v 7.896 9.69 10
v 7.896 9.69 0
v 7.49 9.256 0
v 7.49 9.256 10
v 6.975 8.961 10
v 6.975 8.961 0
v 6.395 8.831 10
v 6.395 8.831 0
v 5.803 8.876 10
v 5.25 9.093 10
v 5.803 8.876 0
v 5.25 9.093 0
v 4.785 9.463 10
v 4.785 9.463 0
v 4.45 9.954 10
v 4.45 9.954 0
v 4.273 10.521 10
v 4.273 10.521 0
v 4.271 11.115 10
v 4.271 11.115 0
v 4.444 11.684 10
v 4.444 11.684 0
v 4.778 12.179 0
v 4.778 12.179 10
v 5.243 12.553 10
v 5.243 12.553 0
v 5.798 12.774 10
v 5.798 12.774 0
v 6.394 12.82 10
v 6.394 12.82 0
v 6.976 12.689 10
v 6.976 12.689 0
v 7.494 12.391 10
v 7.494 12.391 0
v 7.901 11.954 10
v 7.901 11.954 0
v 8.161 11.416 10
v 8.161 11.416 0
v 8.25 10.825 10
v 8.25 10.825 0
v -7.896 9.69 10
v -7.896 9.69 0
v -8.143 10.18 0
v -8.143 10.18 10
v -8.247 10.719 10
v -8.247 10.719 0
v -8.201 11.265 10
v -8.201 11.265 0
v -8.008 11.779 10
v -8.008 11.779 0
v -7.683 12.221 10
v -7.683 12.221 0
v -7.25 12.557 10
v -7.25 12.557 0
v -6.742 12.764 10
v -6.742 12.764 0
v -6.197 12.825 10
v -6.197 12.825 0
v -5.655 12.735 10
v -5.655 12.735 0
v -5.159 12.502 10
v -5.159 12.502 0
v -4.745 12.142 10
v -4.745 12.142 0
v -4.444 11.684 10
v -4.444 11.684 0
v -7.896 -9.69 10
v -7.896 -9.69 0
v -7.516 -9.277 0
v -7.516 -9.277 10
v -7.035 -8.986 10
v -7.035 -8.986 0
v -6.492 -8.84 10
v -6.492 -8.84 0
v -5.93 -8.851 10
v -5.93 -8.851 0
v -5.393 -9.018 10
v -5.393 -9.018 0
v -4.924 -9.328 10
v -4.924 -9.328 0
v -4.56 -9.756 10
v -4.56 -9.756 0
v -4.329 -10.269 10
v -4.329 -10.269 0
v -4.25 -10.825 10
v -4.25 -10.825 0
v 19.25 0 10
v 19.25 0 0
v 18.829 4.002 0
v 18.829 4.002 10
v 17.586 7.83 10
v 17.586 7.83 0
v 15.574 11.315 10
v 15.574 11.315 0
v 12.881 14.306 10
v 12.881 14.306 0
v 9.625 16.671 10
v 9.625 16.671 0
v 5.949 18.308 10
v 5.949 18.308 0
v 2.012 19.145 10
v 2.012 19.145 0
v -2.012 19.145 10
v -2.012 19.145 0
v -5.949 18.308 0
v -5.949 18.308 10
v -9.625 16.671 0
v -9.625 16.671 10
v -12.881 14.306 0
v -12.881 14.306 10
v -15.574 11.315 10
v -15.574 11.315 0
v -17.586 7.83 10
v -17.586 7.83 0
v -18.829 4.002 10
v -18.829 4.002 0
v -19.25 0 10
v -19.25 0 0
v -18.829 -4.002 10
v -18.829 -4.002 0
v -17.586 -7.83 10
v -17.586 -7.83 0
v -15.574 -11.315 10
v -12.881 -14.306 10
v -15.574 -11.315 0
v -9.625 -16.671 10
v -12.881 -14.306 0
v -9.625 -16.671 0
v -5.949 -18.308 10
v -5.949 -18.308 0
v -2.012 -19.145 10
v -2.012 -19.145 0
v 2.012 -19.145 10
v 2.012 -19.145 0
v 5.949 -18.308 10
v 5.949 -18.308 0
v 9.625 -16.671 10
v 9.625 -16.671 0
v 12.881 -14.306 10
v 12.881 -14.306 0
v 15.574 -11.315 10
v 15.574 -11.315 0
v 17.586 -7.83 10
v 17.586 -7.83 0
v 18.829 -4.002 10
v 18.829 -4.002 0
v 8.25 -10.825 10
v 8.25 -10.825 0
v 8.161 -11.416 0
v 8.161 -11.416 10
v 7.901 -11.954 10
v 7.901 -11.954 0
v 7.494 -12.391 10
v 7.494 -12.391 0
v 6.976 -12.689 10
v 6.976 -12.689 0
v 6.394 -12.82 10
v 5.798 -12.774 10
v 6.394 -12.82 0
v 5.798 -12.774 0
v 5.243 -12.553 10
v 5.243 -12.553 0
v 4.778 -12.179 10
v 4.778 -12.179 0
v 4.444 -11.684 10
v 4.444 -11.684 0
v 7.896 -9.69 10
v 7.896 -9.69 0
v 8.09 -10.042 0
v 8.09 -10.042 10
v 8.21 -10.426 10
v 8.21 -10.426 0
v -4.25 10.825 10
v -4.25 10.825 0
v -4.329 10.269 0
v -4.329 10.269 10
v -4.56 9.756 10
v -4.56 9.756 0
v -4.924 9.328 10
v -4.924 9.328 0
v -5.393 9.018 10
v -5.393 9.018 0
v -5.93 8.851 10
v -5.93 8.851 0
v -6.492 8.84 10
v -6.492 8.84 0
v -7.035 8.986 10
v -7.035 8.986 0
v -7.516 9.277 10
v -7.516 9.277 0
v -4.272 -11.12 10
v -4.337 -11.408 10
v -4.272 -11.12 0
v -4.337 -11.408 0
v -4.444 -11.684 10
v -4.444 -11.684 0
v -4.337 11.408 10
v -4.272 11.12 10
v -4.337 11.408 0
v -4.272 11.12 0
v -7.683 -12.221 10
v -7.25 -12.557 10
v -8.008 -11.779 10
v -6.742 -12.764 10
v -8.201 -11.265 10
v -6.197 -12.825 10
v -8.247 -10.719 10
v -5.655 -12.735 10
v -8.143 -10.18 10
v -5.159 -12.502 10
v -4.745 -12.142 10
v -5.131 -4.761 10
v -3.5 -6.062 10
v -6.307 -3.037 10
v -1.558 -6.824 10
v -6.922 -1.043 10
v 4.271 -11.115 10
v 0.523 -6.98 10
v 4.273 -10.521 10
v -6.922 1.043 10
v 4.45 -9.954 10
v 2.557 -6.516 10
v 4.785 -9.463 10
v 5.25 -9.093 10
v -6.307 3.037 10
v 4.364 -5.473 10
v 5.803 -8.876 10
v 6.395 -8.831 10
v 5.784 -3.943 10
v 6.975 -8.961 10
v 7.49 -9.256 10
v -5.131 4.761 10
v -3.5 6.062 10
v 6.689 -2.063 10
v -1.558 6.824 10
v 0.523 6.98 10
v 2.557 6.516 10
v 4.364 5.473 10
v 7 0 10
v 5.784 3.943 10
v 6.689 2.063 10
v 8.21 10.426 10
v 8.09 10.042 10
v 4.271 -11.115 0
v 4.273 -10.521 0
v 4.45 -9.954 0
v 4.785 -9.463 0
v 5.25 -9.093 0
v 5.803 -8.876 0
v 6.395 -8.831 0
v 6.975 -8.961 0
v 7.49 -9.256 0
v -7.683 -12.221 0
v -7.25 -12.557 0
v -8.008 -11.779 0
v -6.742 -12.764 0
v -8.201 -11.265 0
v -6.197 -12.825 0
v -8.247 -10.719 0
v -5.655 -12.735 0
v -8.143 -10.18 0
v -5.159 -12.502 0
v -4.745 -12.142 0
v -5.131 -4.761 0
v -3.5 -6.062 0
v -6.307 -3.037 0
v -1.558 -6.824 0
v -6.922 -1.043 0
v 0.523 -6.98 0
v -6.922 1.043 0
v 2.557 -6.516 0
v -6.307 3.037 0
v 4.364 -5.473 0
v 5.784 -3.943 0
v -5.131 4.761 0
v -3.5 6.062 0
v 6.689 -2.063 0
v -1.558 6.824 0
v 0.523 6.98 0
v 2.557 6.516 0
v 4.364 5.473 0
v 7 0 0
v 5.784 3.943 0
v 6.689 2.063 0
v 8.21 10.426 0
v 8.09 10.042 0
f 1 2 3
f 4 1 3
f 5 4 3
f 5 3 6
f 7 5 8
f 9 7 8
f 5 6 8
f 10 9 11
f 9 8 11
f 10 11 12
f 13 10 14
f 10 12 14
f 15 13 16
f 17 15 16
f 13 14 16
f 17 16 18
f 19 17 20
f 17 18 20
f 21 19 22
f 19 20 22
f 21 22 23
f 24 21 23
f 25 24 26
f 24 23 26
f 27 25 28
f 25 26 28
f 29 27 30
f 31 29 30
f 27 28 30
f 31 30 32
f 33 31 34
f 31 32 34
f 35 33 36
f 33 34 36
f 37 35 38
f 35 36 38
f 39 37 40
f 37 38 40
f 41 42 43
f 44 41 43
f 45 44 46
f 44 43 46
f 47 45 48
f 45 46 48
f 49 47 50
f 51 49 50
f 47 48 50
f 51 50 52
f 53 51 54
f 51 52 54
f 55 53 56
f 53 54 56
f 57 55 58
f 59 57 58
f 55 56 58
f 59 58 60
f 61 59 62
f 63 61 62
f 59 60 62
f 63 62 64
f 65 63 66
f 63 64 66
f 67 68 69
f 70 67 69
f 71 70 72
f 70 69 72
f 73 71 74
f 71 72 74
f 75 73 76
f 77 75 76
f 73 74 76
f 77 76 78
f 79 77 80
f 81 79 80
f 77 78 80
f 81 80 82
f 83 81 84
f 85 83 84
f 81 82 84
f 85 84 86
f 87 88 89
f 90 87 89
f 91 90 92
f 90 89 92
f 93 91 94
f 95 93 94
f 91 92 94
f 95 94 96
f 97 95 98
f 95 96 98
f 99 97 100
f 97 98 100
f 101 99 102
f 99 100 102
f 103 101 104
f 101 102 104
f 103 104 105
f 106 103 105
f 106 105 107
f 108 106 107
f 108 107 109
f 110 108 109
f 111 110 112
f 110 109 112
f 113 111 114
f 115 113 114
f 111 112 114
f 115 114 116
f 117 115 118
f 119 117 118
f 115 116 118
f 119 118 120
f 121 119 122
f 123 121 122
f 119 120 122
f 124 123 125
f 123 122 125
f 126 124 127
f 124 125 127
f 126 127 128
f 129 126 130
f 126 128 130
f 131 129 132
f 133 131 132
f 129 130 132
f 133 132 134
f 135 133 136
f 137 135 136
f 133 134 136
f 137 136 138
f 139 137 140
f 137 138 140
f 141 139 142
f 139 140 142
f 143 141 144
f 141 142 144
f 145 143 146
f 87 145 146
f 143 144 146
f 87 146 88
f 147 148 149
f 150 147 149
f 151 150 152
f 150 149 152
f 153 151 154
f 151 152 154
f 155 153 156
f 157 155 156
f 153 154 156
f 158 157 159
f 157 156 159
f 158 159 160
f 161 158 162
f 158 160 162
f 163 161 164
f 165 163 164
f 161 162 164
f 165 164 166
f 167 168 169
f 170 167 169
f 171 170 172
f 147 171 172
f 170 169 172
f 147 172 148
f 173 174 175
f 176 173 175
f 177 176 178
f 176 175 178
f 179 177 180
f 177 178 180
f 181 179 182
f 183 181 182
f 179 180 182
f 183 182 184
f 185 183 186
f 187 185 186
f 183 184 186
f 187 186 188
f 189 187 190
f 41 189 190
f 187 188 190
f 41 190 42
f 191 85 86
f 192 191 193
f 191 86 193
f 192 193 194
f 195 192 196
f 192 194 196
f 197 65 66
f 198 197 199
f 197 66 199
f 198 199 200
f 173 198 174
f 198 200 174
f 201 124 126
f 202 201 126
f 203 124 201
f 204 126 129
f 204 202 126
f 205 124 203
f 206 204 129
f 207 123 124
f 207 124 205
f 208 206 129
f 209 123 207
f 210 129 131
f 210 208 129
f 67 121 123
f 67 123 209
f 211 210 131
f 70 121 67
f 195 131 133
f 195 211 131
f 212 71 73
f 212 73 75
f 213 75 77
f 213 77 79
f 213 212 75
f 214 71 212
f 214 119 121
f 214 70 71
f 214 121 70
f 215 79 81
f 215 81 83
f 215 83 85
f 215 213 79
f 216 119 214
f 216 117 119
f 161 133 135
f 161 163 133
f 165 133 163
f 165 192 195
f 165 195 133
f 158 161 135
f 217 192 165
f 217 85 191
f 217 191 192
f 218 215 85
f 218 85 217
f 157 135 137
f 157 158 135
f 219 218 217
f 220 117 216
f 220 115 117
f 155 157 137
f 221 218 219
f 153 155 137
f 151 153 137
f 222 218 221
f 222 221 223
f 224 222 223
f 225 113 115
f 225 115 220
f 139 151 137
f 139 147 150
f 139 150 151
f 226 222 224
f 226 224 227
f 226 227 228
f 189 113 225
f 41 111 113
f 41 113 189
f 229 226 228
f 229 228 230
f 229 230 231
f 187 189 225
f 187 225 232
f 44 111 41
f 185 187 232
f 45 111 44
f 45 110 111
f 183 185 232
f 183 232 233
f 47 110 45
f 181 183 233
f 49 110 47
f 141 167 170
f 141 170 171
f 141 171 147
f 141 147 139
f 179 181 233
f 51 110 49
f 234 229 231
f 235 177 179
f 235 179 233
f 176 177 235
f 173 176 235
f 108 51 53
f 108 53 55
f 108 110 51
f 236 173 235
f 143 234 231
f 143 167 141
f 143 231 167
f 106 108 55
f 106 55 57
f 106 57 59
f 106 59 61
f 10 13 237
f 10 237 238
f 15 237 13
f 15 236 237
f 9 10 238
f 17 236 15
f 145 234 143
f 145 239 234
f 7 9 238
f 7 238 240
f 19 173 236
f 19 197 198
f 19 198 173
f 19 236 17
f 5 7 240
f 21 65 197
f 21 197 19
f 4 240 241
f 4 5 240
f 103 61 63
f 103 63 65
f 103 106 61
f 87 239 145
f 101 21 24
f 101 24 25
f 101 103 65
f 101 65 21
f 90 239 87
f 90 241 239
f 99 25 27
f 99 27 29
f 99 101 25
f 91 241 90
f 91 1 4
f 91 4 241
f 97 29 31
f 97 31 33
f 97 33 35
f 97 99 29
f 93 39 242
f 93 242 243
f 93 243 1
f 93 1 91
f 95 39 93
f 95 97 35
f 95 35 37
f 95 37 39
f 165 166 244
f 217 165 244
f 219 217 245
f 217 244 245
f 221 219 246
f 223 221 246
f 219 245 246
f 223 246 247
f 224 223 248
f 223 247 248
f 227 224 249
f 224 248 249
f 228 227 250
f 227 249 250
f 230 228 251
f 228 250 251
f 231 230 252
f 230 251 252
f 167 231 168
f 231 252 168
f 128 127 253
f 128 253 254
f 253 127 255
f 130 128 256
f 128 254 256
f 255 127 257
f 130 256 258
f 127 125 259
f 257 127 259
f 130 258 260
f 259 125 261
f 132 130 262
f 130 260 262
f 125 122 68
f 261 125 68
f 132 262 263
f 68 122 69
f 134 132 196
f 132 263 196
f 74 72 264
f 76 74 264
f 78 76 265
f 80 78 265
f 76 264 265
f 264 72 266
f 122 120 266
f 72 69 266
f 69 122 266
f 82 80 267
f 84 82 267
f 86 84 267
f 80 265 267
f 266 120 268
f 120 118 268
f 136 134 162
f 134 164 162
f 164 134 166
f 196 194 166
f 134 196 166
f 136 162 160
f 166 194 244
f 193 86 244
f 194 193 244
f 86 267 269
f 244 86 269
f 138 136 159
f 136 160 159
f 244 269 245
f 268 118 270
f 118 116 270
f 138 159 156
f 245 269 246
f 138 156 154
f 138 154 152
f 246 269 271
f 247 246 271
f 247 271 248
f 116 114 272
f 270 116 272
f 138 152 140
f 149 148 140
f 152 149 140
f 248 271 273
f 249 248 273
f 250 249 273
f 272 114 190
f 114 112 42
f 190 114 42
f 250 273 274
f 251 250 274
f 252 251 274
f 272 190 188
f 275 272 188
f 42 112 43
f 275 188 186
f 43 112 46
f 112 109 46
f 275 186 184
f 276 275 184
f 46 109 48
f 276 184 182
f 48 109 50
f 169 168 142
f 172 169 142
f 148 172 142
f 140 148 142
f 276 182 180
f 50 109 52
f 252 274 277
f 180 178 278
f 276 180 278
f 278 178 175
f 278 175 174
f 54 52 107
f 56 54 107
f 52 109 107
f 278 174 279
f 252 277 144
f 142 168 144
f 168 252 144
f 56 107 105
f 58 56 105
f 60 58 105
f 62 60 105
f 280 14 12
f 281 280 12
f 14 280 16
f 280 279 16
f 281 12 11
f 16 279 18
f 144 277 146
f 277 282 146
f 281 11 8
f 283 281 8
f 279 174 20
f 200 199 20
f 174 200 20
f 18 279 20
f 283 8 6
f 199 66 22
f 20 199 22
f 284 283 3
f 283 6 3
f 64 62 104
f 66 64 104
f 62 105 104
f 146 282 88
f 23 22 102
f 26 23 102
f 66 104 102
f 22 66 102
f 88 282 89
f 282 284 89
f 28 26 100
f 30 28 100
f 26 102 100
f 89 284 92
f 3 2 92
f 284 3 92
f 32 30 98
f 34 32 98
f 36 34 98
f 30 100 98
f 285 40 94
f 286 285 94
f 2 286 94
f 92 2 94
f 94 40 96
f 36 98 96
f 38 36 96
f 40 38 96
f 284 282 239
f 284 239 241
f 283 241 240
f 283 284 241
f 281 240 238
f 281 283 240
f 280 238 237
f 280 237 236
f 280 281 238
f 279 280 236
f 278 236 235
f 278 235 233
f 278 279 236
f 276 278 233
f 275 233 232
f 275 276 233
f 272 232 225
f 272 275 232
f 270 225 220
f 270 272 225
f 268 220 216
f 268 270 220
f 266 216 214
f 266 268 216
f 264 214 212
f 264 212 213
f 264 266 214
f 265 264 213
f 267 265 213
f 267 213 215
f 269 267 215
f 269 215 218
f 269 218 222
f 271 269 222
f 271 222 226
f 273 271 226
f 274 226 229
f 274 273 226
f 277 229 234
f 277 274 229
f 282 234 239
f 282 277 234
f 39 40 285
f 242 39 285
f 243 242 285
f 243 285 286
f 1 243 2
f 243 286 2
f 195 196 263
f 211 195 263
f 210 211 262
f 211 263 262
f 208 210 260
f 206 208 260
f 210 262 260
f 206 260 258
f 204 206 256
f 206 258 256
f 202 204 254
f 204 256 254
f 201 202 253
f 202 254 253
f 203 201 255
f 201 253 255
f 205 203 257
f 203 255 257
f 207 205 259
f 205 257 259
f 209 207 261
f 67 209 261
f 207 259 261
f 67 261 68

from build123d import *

# Parameters (mm, degrees)
F0_R     = 19.25
F0_R_2   = 7
F1_DEPTH = 10


with BuildPart() as f1:
    # F0 (on Top) → F1 (new body)
    with BuildSketch(Plane.XY):
        Circle(F0_R)
        with BuildLine():
            ThreePointArc((7.896499, 9.689959), (11.290621, 5.363942), (12.5, 0))
            ThreePointArc((12.5, 0), (11.290621, -5.363942), (7.896499, -9.689959))
            ThreePointArc((7.896499, -9.689959), (8.159581, -10.230758), (8.25, -10.825318))
            ThreePointArc((8.25, -10.825318), (6.689887, -12.776343), (4.443501, -11.683548))
            ThreePointArc((4.443501, -11.683548), (0, -12.5), (-4.443501, -11.683548))
            ThreePointArc((-4.443501, -11.683548), (-7.25, -12.557368), (-7.896499, -9.689959))
            ThreePointArc((-7.896499, -9.689959), (-12.5, 0), (-7.896499, 9.689959))
            ThreePointArc((-7.896499, 9.689959), (-7.25, 12.557368), (-4.443501, 11.683548))
            ThreePointArc((-4.443501, 11.683548), (0, 12.5), (4.443501, 11.683548))
            ThreePointArc((4.443501, 11.683548), (6.689887, 12.776343), (8.25, 10.825318))
            ThreePointArc((8.25, 10.825318), (8.159581, 10.230758), (7.896499, 9.689959))
        make_face(mode=Mode.SUBTRACT)
        with BuildLine():
            ThreePointArc((7.896499, -9.689959), (11.290621, -5.363942), (12.5, 0))
            ThreePointArc((12.5, 0), (11.290621, 5.363942), (7.896499, 9.689959))
            ThreePointArc((7.896499, 9.689959), (5.25, 9.093267), (4.443501, 11.683548))
            ThreePointArc((4.443501, 11.683548), (0, 12.5), (-4.443501, 11.683548))
            ThreePointArc((-4.443501, 11.683548), (-4.298975, 11.265205), (-4.25, 10.825318))
            ThreePointArc((-4.25, 10.825318), (-5.655441, 8.915737), (-7.896499, 9.689959))
            ThreePointArc((-7.896499, 9.689959), (-12.5, 0), (-7.896499, -9.689959))
            ThreePointArc((-7.896499, -9.689959), (-5.655441, -8.915737), (-4.25, -10.825318))
            ThreePointArc((-4.25, -10.825318), (-4.298975, -11.265205), (-4.443501, -11.683548))
            ThreePointArc((-4.443501, -11.683548), (0, -12.5), (4.443501, -11.683548))
            ThreePointArc((4.443501, -11.683548), (5.25, -9.093267), (7.896499, -9.689959))
        make_face()
        Circle(F0_R_2, mode=Mode.SUBTRACT)
    extrude(amount=F1_DEPTH)


solid = f1.part
